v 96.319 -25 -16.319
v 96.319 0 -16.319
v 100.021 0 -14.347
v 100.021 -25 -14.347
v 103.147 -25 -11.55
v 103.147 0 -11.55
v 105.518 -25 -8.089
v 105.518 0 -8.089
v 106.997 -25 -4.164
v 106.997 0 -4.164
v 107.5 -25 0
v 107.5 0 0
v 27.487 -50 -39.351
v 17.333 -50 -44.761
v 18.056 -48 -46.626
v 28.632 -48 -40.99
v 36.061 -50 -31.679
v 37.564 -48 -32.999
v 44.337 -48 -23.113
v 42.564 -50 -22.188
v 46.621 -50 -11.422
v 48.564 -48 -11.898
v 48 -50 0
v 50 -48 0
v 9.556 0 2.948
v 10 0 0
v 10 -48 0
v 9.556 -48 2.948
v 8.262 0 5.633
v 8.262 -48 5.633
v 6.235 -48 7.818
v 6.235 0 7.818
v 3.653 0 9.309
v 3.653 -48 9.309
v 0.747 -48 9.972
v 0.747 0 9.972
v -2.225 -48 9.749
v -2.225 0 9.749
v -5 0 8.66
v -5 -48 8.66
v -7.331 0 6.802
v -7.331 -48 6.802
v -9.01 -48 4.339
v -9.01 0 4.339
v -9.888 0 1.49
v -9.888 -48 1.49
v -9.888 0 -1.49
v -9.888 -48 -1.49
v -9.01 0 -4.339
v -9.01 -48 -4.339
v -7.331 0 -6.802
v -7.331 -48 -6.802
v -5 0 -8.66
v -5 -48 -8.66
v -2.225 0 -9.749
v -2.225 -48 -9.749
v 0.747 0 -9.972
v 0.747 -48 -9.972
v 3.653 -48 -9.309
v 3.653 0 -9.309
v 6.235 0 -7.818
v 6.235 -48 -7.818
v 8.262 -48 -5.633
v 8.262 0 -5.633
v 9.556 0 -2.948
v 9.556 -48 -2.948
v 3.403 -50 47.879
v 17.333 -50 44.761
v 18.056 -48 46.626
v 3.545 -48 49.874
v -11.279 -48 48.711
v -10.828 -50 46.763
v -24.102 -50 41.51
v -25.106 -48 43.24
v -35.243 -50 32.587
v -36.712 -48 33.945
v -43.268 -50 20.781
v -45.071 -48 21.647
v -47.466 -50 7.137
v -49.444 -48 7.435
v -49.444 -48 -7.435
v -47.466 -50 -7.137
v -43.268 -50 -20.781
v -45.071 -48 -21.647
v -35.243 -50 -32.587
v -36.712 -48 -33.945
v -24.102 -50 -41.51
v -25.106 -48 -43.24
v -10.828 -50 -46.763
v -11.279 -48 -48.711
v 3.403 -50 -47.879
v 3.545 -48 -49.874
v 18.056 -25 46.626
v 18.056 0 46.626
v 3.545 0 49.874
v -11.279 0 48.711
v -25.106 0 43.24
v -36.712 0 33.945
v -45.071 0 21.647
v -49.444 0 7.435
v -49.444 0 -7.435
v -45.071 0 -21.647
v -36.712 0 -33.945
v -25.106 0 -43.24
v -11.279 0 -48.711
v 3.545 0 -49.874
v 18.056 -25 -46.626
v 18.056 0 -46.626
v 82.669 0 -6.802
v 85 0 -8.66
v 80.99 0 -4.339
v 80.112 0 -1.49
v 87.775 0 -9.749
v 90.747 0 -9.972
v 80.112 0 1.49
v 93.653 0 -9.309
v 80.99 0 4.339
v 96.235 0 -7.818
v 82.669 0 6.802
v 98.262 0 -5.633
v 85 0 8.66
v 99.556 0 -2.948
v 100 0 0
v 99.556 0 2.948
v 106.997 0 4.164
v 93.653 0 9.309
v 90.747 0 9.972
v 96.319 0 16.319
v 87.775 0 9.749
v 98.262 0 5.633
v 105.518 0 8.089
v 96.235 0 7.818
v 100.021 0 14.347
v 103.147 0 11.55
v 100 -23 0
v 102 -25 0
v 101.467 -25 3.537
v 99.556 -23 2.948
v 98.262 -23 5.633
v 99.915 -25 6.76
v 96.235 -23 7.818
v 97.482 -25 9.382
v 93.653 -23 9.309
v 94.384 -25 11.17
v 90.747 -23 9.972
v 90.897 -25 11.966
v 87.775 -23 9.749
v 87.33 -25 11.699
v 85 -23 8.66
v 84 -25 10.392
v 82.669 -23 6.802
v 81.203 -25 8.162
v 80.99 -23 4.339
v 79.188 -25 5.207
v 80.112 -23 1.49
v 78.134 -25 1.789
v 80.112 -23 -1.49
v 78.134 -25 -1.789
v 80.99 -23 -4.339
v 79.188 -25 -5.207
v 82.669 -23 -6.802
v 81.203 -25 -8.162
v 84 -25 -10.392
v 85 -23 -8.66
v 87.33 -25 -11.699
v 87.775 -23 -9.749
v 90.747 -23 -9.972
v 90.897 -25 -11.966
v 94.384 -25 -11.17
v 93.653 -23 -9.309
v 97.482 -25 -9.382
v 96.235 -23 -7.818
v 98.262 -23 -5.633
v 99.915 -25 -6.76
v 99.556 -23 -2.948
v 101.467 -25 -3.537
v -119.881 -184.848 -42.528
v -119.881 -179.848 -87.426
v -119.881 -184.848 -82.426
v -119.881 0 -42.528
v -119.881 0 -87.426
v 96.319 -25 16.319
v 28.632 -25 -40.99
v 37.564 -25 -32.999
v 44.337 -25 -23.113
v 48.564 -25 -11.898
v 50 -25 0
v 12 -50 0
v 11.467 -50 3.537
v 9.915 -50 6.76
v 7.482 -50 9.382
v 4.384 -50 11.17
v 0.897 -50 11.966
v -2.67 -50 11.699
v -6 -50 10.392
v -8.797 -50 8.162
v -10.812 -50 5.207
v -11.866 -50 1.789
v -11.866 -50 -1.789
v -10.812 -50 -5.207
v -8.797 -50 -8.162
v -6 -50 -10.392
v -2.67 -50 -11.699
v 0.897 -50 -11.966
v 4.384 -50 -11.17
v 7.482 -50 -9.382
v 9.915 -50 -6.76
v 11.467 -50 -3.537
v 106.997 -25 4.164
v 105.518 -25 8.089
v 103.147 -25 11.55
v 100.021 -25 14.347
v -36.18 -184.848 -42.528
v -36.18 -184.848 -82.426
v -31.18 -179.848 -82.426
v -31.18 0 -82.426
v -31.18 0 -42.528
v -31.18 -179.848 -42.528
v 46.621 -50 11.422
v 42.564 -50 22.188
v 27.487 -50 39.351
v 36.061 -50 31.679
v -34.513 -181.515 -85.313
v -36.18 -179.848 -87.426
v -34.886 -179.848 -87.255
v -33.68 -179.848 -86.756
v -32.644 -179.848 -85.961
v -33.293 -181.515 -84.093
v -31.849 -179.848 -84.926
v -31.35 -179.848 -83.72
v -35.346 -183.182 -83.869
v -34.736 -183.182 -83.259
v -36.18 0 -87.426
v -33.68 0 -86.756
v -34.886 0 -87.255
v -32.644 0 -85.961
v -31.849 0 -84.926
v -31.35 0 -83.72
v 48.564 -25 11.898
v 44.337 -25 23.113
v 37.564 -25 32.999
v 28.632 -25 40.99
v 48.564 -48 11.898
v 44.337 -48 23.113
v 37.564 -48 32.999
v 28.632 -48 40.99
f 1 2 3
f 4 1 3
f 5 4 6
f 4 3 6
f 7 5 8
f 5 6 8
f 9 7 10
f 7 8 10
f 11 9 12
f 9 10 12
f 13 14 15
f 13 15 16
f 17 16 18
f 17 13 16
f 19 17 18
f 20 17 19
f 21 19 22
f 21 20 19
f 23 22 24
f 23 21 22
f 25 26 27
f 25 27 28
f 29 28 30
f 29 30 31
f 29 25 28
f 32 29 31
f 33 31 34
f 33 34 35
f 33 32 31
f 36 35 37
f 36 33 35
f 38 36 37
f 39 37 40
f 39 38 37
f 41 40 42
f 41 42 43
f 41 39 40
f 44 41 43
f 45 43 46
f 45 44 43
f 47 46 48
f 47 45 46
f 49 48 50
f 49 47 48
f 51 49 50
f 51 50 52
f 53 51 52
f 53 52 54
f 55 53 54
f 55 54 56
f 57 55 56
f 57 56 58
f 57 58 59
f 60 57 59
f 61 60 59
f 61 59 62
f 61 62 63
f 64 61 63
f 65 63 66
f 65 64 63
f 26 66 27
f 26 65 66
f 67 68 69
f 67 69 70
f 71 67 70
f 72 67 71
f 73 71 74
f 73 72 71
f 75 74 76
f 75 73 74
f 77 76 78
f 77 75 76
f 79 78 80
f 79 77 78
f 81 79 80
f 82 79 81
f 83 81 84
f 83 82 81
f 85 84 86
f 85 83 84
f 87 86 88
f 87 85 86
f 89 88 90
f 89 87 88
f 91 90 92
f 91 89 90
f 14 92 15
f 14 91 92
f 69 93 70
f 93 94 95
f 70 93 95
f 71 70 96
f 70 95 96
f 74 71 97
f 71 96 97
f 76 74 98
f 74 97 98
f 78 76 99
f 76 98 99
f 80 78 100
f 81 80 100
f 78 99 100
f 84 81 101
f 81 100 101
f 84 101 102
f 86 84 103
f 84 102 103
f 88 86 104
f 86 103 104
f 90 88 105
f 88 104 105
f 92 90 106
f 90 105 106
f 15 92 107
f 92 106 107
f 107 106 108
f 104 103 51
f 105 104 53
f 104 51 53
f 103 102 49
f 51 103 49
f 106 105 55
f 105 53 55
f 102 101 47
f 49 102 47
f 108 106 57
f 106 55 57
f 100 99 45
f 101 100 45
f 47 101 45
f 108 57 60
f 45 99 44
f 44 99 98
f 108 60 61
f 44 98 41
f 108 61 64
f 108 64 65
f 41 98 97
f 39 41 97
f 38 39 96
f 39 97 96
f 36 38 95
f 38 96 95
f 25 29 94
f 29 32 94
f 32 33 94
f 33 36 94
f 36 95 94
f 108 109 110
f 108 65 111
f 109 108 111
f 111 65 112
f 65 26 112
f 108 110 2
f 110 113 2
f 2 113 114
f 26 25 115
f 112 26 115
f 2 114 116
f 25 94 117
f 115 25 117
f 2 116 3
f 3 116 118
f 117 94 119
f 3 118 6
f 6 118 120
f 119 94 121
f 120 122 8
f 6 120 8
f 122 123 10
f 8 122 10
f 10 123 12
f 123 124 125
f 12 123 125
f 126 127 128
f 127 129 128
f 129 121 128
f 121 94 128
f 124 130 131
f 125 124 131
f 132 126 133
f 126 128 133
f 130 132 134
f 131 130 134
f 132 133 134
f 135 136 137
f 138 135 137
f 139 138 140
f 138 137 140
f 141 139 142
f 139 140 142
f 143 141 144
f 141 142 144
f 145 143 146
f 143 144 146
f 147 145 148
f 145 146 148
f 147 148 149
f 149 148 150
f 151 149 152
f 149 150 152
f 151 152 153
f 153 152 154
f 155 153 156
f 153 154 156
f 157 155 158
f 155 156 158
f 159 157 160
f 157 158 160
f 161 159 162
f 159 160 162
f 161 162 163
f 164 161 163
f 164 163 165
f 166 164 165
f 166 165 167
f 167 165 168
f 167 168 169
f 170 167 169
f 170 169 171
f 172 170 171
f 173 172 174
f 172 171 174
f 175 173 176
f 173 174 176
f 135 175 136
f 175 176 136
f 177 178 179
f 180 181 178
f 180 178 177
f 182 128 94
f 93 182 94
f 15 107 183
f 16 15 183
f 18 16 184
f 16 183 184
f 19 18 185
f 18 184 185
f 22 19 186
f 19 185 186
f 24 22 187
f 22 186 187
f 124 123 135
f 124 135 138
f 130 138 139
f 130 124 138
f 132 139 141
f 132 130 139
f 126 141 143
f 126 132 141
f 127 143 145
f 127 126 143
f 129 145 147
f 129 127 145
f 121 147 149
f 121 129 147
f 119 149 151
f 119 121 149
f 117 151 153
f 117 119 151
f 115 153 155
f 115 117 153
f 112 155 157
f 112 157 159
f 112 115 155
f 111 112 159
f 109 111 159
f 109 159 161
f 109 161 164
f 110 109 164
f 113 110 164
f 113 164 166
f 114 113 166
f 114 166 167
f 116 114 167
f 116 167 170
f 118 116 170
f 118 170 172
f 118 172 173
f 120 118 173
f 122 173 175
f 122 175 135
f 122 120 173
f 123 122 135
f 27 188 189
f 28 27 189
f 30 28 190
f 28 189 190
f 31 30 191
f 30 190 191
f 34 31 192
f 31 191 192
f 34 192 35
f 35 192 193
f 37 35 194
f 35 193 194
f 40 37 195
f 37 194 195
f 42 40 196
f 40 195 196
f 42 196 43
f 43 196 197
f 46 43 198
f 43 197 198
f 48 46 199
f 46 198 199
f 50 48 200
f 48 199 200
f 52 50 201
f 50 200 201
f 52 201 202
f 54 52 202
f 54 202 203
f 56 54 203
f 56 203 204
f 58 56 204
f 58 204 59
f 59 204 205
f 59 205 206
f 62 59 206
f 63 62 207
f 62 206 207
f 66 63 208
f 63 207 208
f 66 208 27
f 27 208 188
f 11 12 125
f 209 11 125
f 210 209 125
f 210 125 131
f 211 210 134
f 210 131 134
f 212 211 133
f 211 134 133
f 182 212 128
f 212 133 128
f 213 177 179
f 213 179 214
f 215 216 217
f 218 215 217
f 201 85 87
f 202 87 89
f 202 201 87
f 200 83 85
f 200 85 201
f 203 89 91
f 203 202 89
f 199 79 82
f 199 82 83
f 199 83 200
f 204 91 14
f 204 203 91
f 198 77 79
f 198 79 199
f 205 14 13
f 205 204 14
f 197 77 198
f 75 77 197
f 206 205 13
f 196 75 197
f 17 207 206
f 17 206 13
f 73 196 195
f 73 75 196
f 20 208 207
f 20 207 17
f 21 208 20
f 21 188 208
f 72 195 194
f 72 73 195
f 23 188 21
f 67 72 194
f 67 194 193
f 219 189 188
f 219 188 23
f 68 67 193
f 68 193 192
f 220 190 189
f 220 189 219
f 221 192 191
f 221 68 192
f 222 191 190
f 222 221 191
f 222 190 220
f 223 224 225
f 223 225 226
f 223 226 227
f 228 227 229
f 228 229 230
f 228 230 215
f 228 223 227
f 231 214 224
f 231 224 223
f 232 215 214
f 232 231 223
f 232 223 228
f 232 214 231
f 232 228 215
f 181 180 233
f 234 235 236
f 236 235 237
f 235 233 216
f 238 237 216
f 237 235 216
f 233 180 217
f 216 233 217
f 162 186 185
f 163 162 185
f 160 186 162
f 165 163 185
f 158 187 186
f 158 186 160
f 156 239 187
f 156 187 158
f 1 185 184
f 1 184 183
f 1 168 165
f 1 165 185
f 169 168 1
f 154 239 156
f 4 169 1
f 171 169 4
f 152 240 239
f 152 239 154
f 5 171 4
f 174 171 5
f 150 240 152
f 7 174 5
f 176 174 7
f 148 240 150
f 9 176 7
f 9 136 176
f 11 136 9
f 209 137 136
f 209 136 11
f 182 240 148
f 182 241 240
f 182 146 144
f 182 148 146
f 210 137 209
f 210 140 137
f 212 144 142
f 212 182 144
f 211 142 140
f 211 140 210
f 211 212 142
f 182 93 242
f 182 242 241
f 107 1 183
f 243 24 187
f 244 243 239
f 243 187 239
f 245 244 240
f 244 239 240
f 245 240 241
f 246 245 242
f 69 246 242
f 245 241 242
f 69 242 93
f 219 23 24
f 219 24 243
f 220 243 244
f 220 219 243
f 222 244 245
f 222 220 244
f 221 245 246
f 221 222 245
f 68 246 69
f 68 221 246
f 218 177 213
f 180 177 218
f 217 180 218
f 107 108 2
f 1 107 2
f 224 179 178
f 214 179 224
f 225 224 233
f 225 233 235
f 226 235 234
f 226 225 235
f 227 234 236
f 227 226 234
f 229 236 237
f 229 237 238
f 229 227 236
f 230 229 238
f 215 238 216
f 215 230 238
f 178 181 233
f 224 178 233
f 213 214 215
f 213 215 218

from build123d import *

# Parameters (mm, degrees)
F0_R     = 10
F1_DEPTH = 25
F2_DEPTH = 50
F3_SIZE  = 2
F4_W     = 88.701761
F4_H     = 44.897619
F5_DEPTH = 184.848249
F6_R     = 5
F7_SIZE  = 5


with BuildPart() as f1:
    # F0 (on Front) → F1 (new body)
    with BuildSketch(Plane.XZ):
        with BuildLine():
            ThreePointArc((18.055556, -46.62614), (41.247896, -28.259708), (50, 0))
            ThreePointArc((50, 0), (41.247896, 28.259708), (18.055556, 46.62614))
            ThreePointArc((18.055556, 46.62614), (-50, 0), (18.055556, -46.62614))
        make_face()
        Circle(F0_R, mode=Mode.SUBTRACT)
        with BuildLine():
            ThreePointArc((18.055556, 46.62614), (41.247896, 28.259708), (50, 0))
            ThreePointArc((50, 0), (41.247896, -28.259708), (18.055556, -46.62614))
            Line((18.055556, -46.62614), (96.319444, -16.319149))
            ThreePointArc((96.319444, -16.319149), (72.5, 0), (96.319444, 16.319149))
            Line((96.319444, 16.319149), (18.055556, 46.62614))
        make_face()
        with BuildLine():
            ThreePointArc((107.5, 0), (104.436763, 9.890898), (96.319444, 16.319149))
            ThreePointArc((96.319444, 16.319149), (72.5, 0), (96.319444, -16.319149))
            ThreePointArc((96.319444, -16.319149), (104.436763, -9.890898), (107.5, 0))
        make_face()
        with Locations((90, 0)):
            Circle(F0_R, mode=Mode.SUBTRACT)
    extrude(amount=F1_DEPTH)

    # F0 (on Front) → F2 (join)
    with BuildSketch(Plane.XZ):
        with BuildLine():
            ThreePointArc((18.055556, -46.62614), (41.247896, -28.259708), (50, 0))
            ThreePointArc((50, 0), (41.247896, 28.259708), (18.055556, 46.62614))
            ThreePointArc((18.055556, 46.62614), (-50, 0), (18.055556, -46.62614))
        make_face()
        Circle(F0_R, mode=Mode.SUBTRACT)
    extrude(amount=F2_DEPTH)

    # F3
    f3_edges = [f1.edges().sort_by_distance(p)[0] for p in [
        (-18.055556, -50, 46.62614),
        (-10, -50, 0),
        (80, -25, 0),
    ]]
    chamfer(f3_edges, length=F3_SIZE)


with BuildPart() as f5:
    # F4 (on face) → F5 (new body)
    with BuildSketch(Plane.XZ):
        with Locations((-75.530496, -64.977056)):
            Rectangle(F4_W, F4_H)
    extrude(amount=F5_DEPTH)

    # F6
    f6_edges = [f5.edges().sort_by_distance(p)[0] for p in [
        (-31.179616, -92.424124, -87.425865),
    ]]
    fillet(f6_edges, radius=F6_R)

    # F7
    f7_edges = [f5.edges().sort_by_distance(p)[0] for p in [
        (-78.030496, -184.848249, -87.425865),
    ]]
    chamfer(f7_edges, length=F7_SIZE)


solid = Compound([f1.part, f5.part])
